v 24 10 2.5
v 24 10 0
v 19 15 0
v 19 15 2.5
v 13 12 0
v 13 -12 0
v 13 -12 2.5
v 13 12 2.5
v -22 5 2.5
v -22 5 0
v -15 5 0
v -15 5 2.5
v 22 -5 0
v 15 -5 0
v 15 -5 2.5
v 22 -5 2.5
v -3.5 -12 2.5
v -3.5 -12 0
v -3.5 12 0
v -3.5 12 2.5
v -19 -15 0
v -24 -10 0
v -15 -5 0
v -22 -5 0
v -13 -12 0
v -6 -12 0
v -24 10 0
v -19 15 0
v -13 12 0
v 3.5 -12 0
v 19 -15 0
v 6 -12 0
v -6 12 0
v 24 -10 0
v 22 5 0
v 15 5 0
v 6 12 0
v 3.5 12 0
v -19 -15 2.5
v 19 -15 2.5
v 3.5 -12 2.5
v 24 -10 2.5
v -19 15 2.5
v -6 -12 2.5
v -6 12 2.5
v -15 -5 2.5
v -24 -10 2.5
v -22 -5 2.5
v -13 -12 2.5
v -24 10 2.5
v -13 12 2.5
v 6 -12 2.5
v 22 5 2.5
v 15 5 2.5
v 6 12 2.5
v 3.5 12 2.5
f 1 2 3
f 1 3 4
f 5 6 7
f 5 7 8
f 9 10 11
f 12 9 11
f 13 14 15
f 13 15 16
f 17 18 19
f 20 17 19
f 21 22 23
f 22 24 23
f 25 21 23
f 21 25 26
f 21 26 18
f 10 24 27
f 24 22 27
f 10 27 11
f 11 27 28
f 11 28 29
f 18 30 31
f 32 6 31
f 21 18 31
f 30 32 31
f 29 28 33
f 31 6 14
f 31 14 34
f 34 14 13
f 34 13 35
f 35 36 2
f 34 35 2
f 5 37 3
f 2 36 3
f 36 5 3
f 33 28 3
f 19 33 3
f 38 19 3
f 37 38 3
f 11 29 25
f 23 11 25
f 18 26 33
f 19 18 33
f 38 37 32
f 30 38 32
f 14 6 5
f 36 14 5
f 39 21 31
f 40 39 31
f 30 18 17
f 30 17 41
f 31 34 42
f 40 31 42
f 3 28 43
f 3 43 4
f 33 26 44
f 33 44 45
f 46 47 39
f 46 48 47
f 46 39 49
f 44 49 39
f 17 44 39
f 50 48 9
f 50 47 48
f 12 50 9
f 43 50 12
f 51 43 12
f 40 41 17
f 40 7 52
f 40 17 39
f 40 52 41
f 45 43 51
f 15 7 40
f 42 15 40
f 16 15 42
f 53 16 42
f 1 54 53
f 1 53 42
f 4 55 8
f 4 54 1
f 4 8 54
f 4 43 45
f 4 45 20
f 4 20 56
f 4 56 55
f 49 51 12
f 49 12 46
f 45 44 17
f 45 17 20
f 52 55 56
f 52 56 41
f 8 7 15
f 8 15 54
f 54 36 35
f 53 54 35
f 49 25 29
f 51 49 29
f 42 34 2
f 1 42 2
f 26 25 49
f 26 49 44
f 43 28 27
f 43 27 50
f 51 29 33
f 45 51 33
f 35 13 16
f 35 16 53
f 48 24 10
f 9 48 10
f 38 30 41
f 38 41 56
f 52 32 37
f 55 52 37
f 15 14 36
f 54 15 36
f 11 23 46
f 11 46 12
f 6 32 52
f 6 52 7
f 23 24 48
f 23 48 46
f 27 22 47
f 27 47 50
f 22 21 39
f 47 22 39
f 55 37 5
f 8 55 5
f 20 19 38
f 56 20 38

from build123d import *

# Parameters (mm, degrees)
F0_W     = 7
F0_H     = 24
F0_W_2   = 48
F0_H_2   = 30
F0_H_3   = 10
F1_DEPTH = 2.5
F2_DEPTH = 2.5
F3_SIZE2 = 5
F3_SIZE  = 5


with BuildPart() as f1:
    # F0 (on Top) → F1 (new body)
    with BuildSketch(Plane.XY):
        with Locations((9.5, 0)):
            Rectangle(F0_W, F0_H)
        Rectangle(F0_W_2, F0_H_2)
        with Locations((-18.5, 0)):
            Rectangle(F0_W, F0_H_3, mode=Mode.SUBTRACT)
        with Locations((-9.5, 0)):
            Rectangle(F0_W, F0_H, mode=Mode.SUBTRACT)
        Rectangle(F0_W, F0_H, mode=Mode.SUBTRACT)
        with Locations((9.5, 0)):
            Rectangle(F0_W, F0_H, mode=Mode.SUBTRACT)
        with Locations((18.5, 0)):
            Rectangle(F0_W, F0_H_3, mode=Mode.SUBTRACT)
        with Locations((-18.5, 0)):
            Rectangle(F0_W, F0_H_3)
        with Locations((-9.5, 0)):
            Rectangle(F0_W, F0_H)
        Rectangle(F0_W, F0_H)
        with Locations((18.5, 0)):
            Rectangle(F0_W, F0_H_3)
    extrude(amount=F1_DEPTH)

    # F0 (on Top) → F2 (cut)
    with BuildSketch(Plane.XY):
        with Locations((-18.5, 0)):
            Rectangle(F0_W, F0_H_3)
        with Locations((18.5, 0)):
            Rectangle(F0_W, F0_H_3)
        with Locations((-9.5, 0)):
            Rectangle(F0_W, F0_H)
        Rectangle(F0_W, F0_H)
        with Locations((9.5, 0)):
            Rectangle(F0_W, F0_H)
    extrude(amount=F2_DEPTH, mode=Mode.SUBTRACT)

    # F3
    f3_edges = [f1.edges().sort_by_distance(p)[0] for p in [
        (24, -15, 1.25),
        (24, 15, 1.25),
        (-24, 15, 1.25),
        (-24, -15, 1.25),
    ]]
    chamfer(f3_edges, length=F3_SIZE, length2=F3_SIZE2)


solid = f1.part
